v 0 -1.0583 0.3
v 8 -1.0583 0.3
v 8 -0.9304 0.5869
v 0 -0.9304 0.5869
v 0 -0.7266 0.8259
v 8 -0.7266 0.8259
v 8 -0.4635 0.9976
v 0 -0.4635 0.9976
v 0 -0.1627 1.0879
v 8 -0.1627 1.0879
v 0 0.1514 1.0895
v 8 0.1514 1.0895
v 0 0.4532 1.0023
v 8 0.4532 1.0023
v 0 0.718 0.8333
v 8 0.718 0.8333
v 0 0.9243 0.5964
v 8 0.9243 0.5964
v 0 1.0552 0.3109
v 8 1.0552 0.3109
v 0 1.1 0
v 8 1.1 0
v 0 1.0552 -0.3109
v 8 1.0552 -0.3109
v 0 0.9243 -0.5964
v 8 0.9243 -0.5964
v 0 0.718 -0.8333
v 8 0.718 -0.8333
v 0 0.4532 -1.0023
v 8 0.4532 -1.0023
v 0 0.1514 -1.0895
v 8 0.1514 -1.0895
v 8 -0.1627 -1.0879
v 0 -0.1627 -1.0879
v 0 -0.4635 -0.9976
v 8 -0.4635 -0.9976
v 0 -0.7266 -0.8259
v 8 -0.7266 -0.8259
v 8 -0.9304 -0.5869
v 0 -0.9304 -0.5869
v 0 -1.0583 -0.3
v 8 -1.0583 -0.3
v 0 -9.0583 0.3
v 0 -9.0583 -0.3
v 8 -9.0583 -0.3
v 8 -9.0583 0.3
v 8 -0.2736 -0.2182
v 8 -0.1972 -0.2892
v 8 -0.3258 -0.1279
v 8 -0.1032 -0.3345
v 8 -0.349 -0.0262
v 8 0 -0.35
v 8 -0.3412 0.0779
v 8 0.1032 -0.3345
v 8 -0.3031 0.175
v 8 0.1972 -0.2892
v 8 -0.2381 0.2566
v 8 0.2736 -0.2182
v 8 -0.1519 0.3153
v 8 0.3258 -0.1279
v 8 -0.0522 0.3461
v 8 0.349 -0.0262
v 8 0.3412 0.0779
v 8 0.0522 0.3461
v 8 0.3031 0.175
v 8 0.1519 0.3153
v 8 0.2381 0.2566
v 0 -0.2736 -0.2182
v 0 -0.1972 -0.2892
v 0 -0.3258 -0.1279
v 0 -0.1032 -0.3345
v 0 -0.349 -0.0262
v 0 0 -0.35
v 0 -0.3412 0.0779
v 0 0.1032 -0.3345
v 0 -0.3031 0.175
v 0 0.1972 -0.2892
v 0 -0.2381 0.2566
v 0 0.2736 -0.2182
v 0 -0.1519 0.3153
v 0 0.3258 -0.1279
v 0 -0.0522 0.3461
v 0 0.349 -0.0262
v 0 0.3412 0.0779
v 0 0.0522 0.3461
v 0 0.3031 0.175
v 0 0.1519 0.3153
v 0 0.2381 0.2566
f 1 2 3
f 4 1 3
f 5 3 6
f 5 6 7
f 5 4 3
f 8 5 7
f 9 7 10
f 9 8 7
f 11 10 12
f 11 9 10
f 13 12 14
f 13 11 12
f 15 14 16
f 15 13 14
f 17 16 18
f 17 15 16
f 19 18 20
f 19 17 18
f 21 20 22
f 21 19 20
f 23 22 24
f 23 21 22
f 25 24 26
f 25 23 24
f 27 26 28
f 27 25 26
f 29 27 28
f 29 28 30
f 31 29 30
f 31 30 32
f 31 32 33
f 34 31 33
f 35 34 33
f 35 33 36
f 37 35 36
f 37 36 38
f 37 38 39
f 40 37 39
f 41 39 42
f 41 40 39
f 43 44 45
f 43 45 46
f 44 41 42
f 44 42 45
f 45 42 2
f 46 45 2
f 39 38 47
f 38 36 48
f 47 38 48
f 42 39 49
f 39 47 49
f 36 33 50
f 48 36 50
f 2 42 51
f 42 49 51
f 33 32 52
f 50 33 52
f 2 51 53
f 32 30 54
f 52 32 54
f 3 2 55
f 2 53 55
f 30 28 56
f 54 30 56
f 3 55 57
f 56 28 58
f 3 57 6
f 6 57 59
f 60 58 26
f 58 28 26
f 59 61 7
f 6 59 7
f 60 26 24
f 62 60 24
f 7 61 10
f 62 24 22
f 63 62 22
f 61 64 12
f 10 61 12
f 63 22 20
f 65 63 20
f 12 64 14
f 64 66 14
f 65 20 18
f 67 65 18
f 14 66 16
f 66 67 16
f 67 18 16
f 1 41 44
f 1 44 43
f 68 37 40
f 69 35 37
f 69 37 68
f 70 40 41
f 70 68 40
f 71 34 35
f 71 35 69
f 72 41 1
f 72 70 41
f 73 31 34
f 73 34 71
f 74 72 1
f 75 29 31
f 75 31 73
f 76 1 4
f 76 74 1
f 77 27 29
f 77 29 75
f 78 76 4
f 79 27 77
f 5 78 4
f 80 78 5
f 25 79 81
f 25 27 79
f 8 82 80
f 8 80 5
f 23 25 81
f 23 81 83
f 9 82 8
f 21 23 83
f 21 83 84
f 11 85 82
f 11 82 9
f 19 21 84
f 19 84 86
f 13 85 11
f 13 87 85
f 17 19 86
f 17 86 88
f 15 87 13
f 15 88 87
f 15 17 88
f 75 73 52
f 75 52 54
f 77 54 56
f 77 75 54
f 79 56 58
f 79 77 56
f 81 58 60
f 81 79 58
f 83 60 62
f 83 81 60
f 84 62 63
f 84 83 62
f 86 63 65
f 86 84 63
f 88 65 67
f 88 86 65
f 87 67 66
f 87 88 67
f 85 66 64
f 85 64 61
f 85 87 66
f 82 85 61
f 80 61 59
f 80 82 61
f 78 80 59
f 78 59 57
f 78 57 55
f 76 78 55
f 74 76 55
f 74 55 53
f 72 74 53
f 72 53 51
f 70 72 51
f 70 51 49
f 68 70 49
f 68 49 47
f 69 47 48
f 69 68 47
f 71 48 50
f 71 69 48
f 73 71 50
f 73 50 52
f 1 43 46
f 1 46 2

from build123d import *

# Parameters (mm, degrees)
SKETCH_1_R      = 0.35
EXTRUDE_1_DEPTH = 8


with BuildPart() as part:
    # 草图1 → 凸台-拉伸1 (new body)
    with BuildSketch(Plane(origin=(0, 0, 0), x_dir=(0, 0, -1), z_dir=(1, 0, 0))):
        with BuildLine():
            Line((0.3, -1.058300524), (0.3, -9.058300524))
            Line((0.3, -9.058300524), (-0.3, -9.058300524))
            Line((-0.3, -9.058300524), (-0.3, -1.058300524))
            ThreePointArc((-0.3, -1.058300524), (0, 1.1), (0.3, -1.058300524))
        make_face()
        Circle(SKETCH_1_R, mode=Mode.SUBTRACT)
    extrude(amount=EXTRUDE_1_DEPTH)


solid = part.part
